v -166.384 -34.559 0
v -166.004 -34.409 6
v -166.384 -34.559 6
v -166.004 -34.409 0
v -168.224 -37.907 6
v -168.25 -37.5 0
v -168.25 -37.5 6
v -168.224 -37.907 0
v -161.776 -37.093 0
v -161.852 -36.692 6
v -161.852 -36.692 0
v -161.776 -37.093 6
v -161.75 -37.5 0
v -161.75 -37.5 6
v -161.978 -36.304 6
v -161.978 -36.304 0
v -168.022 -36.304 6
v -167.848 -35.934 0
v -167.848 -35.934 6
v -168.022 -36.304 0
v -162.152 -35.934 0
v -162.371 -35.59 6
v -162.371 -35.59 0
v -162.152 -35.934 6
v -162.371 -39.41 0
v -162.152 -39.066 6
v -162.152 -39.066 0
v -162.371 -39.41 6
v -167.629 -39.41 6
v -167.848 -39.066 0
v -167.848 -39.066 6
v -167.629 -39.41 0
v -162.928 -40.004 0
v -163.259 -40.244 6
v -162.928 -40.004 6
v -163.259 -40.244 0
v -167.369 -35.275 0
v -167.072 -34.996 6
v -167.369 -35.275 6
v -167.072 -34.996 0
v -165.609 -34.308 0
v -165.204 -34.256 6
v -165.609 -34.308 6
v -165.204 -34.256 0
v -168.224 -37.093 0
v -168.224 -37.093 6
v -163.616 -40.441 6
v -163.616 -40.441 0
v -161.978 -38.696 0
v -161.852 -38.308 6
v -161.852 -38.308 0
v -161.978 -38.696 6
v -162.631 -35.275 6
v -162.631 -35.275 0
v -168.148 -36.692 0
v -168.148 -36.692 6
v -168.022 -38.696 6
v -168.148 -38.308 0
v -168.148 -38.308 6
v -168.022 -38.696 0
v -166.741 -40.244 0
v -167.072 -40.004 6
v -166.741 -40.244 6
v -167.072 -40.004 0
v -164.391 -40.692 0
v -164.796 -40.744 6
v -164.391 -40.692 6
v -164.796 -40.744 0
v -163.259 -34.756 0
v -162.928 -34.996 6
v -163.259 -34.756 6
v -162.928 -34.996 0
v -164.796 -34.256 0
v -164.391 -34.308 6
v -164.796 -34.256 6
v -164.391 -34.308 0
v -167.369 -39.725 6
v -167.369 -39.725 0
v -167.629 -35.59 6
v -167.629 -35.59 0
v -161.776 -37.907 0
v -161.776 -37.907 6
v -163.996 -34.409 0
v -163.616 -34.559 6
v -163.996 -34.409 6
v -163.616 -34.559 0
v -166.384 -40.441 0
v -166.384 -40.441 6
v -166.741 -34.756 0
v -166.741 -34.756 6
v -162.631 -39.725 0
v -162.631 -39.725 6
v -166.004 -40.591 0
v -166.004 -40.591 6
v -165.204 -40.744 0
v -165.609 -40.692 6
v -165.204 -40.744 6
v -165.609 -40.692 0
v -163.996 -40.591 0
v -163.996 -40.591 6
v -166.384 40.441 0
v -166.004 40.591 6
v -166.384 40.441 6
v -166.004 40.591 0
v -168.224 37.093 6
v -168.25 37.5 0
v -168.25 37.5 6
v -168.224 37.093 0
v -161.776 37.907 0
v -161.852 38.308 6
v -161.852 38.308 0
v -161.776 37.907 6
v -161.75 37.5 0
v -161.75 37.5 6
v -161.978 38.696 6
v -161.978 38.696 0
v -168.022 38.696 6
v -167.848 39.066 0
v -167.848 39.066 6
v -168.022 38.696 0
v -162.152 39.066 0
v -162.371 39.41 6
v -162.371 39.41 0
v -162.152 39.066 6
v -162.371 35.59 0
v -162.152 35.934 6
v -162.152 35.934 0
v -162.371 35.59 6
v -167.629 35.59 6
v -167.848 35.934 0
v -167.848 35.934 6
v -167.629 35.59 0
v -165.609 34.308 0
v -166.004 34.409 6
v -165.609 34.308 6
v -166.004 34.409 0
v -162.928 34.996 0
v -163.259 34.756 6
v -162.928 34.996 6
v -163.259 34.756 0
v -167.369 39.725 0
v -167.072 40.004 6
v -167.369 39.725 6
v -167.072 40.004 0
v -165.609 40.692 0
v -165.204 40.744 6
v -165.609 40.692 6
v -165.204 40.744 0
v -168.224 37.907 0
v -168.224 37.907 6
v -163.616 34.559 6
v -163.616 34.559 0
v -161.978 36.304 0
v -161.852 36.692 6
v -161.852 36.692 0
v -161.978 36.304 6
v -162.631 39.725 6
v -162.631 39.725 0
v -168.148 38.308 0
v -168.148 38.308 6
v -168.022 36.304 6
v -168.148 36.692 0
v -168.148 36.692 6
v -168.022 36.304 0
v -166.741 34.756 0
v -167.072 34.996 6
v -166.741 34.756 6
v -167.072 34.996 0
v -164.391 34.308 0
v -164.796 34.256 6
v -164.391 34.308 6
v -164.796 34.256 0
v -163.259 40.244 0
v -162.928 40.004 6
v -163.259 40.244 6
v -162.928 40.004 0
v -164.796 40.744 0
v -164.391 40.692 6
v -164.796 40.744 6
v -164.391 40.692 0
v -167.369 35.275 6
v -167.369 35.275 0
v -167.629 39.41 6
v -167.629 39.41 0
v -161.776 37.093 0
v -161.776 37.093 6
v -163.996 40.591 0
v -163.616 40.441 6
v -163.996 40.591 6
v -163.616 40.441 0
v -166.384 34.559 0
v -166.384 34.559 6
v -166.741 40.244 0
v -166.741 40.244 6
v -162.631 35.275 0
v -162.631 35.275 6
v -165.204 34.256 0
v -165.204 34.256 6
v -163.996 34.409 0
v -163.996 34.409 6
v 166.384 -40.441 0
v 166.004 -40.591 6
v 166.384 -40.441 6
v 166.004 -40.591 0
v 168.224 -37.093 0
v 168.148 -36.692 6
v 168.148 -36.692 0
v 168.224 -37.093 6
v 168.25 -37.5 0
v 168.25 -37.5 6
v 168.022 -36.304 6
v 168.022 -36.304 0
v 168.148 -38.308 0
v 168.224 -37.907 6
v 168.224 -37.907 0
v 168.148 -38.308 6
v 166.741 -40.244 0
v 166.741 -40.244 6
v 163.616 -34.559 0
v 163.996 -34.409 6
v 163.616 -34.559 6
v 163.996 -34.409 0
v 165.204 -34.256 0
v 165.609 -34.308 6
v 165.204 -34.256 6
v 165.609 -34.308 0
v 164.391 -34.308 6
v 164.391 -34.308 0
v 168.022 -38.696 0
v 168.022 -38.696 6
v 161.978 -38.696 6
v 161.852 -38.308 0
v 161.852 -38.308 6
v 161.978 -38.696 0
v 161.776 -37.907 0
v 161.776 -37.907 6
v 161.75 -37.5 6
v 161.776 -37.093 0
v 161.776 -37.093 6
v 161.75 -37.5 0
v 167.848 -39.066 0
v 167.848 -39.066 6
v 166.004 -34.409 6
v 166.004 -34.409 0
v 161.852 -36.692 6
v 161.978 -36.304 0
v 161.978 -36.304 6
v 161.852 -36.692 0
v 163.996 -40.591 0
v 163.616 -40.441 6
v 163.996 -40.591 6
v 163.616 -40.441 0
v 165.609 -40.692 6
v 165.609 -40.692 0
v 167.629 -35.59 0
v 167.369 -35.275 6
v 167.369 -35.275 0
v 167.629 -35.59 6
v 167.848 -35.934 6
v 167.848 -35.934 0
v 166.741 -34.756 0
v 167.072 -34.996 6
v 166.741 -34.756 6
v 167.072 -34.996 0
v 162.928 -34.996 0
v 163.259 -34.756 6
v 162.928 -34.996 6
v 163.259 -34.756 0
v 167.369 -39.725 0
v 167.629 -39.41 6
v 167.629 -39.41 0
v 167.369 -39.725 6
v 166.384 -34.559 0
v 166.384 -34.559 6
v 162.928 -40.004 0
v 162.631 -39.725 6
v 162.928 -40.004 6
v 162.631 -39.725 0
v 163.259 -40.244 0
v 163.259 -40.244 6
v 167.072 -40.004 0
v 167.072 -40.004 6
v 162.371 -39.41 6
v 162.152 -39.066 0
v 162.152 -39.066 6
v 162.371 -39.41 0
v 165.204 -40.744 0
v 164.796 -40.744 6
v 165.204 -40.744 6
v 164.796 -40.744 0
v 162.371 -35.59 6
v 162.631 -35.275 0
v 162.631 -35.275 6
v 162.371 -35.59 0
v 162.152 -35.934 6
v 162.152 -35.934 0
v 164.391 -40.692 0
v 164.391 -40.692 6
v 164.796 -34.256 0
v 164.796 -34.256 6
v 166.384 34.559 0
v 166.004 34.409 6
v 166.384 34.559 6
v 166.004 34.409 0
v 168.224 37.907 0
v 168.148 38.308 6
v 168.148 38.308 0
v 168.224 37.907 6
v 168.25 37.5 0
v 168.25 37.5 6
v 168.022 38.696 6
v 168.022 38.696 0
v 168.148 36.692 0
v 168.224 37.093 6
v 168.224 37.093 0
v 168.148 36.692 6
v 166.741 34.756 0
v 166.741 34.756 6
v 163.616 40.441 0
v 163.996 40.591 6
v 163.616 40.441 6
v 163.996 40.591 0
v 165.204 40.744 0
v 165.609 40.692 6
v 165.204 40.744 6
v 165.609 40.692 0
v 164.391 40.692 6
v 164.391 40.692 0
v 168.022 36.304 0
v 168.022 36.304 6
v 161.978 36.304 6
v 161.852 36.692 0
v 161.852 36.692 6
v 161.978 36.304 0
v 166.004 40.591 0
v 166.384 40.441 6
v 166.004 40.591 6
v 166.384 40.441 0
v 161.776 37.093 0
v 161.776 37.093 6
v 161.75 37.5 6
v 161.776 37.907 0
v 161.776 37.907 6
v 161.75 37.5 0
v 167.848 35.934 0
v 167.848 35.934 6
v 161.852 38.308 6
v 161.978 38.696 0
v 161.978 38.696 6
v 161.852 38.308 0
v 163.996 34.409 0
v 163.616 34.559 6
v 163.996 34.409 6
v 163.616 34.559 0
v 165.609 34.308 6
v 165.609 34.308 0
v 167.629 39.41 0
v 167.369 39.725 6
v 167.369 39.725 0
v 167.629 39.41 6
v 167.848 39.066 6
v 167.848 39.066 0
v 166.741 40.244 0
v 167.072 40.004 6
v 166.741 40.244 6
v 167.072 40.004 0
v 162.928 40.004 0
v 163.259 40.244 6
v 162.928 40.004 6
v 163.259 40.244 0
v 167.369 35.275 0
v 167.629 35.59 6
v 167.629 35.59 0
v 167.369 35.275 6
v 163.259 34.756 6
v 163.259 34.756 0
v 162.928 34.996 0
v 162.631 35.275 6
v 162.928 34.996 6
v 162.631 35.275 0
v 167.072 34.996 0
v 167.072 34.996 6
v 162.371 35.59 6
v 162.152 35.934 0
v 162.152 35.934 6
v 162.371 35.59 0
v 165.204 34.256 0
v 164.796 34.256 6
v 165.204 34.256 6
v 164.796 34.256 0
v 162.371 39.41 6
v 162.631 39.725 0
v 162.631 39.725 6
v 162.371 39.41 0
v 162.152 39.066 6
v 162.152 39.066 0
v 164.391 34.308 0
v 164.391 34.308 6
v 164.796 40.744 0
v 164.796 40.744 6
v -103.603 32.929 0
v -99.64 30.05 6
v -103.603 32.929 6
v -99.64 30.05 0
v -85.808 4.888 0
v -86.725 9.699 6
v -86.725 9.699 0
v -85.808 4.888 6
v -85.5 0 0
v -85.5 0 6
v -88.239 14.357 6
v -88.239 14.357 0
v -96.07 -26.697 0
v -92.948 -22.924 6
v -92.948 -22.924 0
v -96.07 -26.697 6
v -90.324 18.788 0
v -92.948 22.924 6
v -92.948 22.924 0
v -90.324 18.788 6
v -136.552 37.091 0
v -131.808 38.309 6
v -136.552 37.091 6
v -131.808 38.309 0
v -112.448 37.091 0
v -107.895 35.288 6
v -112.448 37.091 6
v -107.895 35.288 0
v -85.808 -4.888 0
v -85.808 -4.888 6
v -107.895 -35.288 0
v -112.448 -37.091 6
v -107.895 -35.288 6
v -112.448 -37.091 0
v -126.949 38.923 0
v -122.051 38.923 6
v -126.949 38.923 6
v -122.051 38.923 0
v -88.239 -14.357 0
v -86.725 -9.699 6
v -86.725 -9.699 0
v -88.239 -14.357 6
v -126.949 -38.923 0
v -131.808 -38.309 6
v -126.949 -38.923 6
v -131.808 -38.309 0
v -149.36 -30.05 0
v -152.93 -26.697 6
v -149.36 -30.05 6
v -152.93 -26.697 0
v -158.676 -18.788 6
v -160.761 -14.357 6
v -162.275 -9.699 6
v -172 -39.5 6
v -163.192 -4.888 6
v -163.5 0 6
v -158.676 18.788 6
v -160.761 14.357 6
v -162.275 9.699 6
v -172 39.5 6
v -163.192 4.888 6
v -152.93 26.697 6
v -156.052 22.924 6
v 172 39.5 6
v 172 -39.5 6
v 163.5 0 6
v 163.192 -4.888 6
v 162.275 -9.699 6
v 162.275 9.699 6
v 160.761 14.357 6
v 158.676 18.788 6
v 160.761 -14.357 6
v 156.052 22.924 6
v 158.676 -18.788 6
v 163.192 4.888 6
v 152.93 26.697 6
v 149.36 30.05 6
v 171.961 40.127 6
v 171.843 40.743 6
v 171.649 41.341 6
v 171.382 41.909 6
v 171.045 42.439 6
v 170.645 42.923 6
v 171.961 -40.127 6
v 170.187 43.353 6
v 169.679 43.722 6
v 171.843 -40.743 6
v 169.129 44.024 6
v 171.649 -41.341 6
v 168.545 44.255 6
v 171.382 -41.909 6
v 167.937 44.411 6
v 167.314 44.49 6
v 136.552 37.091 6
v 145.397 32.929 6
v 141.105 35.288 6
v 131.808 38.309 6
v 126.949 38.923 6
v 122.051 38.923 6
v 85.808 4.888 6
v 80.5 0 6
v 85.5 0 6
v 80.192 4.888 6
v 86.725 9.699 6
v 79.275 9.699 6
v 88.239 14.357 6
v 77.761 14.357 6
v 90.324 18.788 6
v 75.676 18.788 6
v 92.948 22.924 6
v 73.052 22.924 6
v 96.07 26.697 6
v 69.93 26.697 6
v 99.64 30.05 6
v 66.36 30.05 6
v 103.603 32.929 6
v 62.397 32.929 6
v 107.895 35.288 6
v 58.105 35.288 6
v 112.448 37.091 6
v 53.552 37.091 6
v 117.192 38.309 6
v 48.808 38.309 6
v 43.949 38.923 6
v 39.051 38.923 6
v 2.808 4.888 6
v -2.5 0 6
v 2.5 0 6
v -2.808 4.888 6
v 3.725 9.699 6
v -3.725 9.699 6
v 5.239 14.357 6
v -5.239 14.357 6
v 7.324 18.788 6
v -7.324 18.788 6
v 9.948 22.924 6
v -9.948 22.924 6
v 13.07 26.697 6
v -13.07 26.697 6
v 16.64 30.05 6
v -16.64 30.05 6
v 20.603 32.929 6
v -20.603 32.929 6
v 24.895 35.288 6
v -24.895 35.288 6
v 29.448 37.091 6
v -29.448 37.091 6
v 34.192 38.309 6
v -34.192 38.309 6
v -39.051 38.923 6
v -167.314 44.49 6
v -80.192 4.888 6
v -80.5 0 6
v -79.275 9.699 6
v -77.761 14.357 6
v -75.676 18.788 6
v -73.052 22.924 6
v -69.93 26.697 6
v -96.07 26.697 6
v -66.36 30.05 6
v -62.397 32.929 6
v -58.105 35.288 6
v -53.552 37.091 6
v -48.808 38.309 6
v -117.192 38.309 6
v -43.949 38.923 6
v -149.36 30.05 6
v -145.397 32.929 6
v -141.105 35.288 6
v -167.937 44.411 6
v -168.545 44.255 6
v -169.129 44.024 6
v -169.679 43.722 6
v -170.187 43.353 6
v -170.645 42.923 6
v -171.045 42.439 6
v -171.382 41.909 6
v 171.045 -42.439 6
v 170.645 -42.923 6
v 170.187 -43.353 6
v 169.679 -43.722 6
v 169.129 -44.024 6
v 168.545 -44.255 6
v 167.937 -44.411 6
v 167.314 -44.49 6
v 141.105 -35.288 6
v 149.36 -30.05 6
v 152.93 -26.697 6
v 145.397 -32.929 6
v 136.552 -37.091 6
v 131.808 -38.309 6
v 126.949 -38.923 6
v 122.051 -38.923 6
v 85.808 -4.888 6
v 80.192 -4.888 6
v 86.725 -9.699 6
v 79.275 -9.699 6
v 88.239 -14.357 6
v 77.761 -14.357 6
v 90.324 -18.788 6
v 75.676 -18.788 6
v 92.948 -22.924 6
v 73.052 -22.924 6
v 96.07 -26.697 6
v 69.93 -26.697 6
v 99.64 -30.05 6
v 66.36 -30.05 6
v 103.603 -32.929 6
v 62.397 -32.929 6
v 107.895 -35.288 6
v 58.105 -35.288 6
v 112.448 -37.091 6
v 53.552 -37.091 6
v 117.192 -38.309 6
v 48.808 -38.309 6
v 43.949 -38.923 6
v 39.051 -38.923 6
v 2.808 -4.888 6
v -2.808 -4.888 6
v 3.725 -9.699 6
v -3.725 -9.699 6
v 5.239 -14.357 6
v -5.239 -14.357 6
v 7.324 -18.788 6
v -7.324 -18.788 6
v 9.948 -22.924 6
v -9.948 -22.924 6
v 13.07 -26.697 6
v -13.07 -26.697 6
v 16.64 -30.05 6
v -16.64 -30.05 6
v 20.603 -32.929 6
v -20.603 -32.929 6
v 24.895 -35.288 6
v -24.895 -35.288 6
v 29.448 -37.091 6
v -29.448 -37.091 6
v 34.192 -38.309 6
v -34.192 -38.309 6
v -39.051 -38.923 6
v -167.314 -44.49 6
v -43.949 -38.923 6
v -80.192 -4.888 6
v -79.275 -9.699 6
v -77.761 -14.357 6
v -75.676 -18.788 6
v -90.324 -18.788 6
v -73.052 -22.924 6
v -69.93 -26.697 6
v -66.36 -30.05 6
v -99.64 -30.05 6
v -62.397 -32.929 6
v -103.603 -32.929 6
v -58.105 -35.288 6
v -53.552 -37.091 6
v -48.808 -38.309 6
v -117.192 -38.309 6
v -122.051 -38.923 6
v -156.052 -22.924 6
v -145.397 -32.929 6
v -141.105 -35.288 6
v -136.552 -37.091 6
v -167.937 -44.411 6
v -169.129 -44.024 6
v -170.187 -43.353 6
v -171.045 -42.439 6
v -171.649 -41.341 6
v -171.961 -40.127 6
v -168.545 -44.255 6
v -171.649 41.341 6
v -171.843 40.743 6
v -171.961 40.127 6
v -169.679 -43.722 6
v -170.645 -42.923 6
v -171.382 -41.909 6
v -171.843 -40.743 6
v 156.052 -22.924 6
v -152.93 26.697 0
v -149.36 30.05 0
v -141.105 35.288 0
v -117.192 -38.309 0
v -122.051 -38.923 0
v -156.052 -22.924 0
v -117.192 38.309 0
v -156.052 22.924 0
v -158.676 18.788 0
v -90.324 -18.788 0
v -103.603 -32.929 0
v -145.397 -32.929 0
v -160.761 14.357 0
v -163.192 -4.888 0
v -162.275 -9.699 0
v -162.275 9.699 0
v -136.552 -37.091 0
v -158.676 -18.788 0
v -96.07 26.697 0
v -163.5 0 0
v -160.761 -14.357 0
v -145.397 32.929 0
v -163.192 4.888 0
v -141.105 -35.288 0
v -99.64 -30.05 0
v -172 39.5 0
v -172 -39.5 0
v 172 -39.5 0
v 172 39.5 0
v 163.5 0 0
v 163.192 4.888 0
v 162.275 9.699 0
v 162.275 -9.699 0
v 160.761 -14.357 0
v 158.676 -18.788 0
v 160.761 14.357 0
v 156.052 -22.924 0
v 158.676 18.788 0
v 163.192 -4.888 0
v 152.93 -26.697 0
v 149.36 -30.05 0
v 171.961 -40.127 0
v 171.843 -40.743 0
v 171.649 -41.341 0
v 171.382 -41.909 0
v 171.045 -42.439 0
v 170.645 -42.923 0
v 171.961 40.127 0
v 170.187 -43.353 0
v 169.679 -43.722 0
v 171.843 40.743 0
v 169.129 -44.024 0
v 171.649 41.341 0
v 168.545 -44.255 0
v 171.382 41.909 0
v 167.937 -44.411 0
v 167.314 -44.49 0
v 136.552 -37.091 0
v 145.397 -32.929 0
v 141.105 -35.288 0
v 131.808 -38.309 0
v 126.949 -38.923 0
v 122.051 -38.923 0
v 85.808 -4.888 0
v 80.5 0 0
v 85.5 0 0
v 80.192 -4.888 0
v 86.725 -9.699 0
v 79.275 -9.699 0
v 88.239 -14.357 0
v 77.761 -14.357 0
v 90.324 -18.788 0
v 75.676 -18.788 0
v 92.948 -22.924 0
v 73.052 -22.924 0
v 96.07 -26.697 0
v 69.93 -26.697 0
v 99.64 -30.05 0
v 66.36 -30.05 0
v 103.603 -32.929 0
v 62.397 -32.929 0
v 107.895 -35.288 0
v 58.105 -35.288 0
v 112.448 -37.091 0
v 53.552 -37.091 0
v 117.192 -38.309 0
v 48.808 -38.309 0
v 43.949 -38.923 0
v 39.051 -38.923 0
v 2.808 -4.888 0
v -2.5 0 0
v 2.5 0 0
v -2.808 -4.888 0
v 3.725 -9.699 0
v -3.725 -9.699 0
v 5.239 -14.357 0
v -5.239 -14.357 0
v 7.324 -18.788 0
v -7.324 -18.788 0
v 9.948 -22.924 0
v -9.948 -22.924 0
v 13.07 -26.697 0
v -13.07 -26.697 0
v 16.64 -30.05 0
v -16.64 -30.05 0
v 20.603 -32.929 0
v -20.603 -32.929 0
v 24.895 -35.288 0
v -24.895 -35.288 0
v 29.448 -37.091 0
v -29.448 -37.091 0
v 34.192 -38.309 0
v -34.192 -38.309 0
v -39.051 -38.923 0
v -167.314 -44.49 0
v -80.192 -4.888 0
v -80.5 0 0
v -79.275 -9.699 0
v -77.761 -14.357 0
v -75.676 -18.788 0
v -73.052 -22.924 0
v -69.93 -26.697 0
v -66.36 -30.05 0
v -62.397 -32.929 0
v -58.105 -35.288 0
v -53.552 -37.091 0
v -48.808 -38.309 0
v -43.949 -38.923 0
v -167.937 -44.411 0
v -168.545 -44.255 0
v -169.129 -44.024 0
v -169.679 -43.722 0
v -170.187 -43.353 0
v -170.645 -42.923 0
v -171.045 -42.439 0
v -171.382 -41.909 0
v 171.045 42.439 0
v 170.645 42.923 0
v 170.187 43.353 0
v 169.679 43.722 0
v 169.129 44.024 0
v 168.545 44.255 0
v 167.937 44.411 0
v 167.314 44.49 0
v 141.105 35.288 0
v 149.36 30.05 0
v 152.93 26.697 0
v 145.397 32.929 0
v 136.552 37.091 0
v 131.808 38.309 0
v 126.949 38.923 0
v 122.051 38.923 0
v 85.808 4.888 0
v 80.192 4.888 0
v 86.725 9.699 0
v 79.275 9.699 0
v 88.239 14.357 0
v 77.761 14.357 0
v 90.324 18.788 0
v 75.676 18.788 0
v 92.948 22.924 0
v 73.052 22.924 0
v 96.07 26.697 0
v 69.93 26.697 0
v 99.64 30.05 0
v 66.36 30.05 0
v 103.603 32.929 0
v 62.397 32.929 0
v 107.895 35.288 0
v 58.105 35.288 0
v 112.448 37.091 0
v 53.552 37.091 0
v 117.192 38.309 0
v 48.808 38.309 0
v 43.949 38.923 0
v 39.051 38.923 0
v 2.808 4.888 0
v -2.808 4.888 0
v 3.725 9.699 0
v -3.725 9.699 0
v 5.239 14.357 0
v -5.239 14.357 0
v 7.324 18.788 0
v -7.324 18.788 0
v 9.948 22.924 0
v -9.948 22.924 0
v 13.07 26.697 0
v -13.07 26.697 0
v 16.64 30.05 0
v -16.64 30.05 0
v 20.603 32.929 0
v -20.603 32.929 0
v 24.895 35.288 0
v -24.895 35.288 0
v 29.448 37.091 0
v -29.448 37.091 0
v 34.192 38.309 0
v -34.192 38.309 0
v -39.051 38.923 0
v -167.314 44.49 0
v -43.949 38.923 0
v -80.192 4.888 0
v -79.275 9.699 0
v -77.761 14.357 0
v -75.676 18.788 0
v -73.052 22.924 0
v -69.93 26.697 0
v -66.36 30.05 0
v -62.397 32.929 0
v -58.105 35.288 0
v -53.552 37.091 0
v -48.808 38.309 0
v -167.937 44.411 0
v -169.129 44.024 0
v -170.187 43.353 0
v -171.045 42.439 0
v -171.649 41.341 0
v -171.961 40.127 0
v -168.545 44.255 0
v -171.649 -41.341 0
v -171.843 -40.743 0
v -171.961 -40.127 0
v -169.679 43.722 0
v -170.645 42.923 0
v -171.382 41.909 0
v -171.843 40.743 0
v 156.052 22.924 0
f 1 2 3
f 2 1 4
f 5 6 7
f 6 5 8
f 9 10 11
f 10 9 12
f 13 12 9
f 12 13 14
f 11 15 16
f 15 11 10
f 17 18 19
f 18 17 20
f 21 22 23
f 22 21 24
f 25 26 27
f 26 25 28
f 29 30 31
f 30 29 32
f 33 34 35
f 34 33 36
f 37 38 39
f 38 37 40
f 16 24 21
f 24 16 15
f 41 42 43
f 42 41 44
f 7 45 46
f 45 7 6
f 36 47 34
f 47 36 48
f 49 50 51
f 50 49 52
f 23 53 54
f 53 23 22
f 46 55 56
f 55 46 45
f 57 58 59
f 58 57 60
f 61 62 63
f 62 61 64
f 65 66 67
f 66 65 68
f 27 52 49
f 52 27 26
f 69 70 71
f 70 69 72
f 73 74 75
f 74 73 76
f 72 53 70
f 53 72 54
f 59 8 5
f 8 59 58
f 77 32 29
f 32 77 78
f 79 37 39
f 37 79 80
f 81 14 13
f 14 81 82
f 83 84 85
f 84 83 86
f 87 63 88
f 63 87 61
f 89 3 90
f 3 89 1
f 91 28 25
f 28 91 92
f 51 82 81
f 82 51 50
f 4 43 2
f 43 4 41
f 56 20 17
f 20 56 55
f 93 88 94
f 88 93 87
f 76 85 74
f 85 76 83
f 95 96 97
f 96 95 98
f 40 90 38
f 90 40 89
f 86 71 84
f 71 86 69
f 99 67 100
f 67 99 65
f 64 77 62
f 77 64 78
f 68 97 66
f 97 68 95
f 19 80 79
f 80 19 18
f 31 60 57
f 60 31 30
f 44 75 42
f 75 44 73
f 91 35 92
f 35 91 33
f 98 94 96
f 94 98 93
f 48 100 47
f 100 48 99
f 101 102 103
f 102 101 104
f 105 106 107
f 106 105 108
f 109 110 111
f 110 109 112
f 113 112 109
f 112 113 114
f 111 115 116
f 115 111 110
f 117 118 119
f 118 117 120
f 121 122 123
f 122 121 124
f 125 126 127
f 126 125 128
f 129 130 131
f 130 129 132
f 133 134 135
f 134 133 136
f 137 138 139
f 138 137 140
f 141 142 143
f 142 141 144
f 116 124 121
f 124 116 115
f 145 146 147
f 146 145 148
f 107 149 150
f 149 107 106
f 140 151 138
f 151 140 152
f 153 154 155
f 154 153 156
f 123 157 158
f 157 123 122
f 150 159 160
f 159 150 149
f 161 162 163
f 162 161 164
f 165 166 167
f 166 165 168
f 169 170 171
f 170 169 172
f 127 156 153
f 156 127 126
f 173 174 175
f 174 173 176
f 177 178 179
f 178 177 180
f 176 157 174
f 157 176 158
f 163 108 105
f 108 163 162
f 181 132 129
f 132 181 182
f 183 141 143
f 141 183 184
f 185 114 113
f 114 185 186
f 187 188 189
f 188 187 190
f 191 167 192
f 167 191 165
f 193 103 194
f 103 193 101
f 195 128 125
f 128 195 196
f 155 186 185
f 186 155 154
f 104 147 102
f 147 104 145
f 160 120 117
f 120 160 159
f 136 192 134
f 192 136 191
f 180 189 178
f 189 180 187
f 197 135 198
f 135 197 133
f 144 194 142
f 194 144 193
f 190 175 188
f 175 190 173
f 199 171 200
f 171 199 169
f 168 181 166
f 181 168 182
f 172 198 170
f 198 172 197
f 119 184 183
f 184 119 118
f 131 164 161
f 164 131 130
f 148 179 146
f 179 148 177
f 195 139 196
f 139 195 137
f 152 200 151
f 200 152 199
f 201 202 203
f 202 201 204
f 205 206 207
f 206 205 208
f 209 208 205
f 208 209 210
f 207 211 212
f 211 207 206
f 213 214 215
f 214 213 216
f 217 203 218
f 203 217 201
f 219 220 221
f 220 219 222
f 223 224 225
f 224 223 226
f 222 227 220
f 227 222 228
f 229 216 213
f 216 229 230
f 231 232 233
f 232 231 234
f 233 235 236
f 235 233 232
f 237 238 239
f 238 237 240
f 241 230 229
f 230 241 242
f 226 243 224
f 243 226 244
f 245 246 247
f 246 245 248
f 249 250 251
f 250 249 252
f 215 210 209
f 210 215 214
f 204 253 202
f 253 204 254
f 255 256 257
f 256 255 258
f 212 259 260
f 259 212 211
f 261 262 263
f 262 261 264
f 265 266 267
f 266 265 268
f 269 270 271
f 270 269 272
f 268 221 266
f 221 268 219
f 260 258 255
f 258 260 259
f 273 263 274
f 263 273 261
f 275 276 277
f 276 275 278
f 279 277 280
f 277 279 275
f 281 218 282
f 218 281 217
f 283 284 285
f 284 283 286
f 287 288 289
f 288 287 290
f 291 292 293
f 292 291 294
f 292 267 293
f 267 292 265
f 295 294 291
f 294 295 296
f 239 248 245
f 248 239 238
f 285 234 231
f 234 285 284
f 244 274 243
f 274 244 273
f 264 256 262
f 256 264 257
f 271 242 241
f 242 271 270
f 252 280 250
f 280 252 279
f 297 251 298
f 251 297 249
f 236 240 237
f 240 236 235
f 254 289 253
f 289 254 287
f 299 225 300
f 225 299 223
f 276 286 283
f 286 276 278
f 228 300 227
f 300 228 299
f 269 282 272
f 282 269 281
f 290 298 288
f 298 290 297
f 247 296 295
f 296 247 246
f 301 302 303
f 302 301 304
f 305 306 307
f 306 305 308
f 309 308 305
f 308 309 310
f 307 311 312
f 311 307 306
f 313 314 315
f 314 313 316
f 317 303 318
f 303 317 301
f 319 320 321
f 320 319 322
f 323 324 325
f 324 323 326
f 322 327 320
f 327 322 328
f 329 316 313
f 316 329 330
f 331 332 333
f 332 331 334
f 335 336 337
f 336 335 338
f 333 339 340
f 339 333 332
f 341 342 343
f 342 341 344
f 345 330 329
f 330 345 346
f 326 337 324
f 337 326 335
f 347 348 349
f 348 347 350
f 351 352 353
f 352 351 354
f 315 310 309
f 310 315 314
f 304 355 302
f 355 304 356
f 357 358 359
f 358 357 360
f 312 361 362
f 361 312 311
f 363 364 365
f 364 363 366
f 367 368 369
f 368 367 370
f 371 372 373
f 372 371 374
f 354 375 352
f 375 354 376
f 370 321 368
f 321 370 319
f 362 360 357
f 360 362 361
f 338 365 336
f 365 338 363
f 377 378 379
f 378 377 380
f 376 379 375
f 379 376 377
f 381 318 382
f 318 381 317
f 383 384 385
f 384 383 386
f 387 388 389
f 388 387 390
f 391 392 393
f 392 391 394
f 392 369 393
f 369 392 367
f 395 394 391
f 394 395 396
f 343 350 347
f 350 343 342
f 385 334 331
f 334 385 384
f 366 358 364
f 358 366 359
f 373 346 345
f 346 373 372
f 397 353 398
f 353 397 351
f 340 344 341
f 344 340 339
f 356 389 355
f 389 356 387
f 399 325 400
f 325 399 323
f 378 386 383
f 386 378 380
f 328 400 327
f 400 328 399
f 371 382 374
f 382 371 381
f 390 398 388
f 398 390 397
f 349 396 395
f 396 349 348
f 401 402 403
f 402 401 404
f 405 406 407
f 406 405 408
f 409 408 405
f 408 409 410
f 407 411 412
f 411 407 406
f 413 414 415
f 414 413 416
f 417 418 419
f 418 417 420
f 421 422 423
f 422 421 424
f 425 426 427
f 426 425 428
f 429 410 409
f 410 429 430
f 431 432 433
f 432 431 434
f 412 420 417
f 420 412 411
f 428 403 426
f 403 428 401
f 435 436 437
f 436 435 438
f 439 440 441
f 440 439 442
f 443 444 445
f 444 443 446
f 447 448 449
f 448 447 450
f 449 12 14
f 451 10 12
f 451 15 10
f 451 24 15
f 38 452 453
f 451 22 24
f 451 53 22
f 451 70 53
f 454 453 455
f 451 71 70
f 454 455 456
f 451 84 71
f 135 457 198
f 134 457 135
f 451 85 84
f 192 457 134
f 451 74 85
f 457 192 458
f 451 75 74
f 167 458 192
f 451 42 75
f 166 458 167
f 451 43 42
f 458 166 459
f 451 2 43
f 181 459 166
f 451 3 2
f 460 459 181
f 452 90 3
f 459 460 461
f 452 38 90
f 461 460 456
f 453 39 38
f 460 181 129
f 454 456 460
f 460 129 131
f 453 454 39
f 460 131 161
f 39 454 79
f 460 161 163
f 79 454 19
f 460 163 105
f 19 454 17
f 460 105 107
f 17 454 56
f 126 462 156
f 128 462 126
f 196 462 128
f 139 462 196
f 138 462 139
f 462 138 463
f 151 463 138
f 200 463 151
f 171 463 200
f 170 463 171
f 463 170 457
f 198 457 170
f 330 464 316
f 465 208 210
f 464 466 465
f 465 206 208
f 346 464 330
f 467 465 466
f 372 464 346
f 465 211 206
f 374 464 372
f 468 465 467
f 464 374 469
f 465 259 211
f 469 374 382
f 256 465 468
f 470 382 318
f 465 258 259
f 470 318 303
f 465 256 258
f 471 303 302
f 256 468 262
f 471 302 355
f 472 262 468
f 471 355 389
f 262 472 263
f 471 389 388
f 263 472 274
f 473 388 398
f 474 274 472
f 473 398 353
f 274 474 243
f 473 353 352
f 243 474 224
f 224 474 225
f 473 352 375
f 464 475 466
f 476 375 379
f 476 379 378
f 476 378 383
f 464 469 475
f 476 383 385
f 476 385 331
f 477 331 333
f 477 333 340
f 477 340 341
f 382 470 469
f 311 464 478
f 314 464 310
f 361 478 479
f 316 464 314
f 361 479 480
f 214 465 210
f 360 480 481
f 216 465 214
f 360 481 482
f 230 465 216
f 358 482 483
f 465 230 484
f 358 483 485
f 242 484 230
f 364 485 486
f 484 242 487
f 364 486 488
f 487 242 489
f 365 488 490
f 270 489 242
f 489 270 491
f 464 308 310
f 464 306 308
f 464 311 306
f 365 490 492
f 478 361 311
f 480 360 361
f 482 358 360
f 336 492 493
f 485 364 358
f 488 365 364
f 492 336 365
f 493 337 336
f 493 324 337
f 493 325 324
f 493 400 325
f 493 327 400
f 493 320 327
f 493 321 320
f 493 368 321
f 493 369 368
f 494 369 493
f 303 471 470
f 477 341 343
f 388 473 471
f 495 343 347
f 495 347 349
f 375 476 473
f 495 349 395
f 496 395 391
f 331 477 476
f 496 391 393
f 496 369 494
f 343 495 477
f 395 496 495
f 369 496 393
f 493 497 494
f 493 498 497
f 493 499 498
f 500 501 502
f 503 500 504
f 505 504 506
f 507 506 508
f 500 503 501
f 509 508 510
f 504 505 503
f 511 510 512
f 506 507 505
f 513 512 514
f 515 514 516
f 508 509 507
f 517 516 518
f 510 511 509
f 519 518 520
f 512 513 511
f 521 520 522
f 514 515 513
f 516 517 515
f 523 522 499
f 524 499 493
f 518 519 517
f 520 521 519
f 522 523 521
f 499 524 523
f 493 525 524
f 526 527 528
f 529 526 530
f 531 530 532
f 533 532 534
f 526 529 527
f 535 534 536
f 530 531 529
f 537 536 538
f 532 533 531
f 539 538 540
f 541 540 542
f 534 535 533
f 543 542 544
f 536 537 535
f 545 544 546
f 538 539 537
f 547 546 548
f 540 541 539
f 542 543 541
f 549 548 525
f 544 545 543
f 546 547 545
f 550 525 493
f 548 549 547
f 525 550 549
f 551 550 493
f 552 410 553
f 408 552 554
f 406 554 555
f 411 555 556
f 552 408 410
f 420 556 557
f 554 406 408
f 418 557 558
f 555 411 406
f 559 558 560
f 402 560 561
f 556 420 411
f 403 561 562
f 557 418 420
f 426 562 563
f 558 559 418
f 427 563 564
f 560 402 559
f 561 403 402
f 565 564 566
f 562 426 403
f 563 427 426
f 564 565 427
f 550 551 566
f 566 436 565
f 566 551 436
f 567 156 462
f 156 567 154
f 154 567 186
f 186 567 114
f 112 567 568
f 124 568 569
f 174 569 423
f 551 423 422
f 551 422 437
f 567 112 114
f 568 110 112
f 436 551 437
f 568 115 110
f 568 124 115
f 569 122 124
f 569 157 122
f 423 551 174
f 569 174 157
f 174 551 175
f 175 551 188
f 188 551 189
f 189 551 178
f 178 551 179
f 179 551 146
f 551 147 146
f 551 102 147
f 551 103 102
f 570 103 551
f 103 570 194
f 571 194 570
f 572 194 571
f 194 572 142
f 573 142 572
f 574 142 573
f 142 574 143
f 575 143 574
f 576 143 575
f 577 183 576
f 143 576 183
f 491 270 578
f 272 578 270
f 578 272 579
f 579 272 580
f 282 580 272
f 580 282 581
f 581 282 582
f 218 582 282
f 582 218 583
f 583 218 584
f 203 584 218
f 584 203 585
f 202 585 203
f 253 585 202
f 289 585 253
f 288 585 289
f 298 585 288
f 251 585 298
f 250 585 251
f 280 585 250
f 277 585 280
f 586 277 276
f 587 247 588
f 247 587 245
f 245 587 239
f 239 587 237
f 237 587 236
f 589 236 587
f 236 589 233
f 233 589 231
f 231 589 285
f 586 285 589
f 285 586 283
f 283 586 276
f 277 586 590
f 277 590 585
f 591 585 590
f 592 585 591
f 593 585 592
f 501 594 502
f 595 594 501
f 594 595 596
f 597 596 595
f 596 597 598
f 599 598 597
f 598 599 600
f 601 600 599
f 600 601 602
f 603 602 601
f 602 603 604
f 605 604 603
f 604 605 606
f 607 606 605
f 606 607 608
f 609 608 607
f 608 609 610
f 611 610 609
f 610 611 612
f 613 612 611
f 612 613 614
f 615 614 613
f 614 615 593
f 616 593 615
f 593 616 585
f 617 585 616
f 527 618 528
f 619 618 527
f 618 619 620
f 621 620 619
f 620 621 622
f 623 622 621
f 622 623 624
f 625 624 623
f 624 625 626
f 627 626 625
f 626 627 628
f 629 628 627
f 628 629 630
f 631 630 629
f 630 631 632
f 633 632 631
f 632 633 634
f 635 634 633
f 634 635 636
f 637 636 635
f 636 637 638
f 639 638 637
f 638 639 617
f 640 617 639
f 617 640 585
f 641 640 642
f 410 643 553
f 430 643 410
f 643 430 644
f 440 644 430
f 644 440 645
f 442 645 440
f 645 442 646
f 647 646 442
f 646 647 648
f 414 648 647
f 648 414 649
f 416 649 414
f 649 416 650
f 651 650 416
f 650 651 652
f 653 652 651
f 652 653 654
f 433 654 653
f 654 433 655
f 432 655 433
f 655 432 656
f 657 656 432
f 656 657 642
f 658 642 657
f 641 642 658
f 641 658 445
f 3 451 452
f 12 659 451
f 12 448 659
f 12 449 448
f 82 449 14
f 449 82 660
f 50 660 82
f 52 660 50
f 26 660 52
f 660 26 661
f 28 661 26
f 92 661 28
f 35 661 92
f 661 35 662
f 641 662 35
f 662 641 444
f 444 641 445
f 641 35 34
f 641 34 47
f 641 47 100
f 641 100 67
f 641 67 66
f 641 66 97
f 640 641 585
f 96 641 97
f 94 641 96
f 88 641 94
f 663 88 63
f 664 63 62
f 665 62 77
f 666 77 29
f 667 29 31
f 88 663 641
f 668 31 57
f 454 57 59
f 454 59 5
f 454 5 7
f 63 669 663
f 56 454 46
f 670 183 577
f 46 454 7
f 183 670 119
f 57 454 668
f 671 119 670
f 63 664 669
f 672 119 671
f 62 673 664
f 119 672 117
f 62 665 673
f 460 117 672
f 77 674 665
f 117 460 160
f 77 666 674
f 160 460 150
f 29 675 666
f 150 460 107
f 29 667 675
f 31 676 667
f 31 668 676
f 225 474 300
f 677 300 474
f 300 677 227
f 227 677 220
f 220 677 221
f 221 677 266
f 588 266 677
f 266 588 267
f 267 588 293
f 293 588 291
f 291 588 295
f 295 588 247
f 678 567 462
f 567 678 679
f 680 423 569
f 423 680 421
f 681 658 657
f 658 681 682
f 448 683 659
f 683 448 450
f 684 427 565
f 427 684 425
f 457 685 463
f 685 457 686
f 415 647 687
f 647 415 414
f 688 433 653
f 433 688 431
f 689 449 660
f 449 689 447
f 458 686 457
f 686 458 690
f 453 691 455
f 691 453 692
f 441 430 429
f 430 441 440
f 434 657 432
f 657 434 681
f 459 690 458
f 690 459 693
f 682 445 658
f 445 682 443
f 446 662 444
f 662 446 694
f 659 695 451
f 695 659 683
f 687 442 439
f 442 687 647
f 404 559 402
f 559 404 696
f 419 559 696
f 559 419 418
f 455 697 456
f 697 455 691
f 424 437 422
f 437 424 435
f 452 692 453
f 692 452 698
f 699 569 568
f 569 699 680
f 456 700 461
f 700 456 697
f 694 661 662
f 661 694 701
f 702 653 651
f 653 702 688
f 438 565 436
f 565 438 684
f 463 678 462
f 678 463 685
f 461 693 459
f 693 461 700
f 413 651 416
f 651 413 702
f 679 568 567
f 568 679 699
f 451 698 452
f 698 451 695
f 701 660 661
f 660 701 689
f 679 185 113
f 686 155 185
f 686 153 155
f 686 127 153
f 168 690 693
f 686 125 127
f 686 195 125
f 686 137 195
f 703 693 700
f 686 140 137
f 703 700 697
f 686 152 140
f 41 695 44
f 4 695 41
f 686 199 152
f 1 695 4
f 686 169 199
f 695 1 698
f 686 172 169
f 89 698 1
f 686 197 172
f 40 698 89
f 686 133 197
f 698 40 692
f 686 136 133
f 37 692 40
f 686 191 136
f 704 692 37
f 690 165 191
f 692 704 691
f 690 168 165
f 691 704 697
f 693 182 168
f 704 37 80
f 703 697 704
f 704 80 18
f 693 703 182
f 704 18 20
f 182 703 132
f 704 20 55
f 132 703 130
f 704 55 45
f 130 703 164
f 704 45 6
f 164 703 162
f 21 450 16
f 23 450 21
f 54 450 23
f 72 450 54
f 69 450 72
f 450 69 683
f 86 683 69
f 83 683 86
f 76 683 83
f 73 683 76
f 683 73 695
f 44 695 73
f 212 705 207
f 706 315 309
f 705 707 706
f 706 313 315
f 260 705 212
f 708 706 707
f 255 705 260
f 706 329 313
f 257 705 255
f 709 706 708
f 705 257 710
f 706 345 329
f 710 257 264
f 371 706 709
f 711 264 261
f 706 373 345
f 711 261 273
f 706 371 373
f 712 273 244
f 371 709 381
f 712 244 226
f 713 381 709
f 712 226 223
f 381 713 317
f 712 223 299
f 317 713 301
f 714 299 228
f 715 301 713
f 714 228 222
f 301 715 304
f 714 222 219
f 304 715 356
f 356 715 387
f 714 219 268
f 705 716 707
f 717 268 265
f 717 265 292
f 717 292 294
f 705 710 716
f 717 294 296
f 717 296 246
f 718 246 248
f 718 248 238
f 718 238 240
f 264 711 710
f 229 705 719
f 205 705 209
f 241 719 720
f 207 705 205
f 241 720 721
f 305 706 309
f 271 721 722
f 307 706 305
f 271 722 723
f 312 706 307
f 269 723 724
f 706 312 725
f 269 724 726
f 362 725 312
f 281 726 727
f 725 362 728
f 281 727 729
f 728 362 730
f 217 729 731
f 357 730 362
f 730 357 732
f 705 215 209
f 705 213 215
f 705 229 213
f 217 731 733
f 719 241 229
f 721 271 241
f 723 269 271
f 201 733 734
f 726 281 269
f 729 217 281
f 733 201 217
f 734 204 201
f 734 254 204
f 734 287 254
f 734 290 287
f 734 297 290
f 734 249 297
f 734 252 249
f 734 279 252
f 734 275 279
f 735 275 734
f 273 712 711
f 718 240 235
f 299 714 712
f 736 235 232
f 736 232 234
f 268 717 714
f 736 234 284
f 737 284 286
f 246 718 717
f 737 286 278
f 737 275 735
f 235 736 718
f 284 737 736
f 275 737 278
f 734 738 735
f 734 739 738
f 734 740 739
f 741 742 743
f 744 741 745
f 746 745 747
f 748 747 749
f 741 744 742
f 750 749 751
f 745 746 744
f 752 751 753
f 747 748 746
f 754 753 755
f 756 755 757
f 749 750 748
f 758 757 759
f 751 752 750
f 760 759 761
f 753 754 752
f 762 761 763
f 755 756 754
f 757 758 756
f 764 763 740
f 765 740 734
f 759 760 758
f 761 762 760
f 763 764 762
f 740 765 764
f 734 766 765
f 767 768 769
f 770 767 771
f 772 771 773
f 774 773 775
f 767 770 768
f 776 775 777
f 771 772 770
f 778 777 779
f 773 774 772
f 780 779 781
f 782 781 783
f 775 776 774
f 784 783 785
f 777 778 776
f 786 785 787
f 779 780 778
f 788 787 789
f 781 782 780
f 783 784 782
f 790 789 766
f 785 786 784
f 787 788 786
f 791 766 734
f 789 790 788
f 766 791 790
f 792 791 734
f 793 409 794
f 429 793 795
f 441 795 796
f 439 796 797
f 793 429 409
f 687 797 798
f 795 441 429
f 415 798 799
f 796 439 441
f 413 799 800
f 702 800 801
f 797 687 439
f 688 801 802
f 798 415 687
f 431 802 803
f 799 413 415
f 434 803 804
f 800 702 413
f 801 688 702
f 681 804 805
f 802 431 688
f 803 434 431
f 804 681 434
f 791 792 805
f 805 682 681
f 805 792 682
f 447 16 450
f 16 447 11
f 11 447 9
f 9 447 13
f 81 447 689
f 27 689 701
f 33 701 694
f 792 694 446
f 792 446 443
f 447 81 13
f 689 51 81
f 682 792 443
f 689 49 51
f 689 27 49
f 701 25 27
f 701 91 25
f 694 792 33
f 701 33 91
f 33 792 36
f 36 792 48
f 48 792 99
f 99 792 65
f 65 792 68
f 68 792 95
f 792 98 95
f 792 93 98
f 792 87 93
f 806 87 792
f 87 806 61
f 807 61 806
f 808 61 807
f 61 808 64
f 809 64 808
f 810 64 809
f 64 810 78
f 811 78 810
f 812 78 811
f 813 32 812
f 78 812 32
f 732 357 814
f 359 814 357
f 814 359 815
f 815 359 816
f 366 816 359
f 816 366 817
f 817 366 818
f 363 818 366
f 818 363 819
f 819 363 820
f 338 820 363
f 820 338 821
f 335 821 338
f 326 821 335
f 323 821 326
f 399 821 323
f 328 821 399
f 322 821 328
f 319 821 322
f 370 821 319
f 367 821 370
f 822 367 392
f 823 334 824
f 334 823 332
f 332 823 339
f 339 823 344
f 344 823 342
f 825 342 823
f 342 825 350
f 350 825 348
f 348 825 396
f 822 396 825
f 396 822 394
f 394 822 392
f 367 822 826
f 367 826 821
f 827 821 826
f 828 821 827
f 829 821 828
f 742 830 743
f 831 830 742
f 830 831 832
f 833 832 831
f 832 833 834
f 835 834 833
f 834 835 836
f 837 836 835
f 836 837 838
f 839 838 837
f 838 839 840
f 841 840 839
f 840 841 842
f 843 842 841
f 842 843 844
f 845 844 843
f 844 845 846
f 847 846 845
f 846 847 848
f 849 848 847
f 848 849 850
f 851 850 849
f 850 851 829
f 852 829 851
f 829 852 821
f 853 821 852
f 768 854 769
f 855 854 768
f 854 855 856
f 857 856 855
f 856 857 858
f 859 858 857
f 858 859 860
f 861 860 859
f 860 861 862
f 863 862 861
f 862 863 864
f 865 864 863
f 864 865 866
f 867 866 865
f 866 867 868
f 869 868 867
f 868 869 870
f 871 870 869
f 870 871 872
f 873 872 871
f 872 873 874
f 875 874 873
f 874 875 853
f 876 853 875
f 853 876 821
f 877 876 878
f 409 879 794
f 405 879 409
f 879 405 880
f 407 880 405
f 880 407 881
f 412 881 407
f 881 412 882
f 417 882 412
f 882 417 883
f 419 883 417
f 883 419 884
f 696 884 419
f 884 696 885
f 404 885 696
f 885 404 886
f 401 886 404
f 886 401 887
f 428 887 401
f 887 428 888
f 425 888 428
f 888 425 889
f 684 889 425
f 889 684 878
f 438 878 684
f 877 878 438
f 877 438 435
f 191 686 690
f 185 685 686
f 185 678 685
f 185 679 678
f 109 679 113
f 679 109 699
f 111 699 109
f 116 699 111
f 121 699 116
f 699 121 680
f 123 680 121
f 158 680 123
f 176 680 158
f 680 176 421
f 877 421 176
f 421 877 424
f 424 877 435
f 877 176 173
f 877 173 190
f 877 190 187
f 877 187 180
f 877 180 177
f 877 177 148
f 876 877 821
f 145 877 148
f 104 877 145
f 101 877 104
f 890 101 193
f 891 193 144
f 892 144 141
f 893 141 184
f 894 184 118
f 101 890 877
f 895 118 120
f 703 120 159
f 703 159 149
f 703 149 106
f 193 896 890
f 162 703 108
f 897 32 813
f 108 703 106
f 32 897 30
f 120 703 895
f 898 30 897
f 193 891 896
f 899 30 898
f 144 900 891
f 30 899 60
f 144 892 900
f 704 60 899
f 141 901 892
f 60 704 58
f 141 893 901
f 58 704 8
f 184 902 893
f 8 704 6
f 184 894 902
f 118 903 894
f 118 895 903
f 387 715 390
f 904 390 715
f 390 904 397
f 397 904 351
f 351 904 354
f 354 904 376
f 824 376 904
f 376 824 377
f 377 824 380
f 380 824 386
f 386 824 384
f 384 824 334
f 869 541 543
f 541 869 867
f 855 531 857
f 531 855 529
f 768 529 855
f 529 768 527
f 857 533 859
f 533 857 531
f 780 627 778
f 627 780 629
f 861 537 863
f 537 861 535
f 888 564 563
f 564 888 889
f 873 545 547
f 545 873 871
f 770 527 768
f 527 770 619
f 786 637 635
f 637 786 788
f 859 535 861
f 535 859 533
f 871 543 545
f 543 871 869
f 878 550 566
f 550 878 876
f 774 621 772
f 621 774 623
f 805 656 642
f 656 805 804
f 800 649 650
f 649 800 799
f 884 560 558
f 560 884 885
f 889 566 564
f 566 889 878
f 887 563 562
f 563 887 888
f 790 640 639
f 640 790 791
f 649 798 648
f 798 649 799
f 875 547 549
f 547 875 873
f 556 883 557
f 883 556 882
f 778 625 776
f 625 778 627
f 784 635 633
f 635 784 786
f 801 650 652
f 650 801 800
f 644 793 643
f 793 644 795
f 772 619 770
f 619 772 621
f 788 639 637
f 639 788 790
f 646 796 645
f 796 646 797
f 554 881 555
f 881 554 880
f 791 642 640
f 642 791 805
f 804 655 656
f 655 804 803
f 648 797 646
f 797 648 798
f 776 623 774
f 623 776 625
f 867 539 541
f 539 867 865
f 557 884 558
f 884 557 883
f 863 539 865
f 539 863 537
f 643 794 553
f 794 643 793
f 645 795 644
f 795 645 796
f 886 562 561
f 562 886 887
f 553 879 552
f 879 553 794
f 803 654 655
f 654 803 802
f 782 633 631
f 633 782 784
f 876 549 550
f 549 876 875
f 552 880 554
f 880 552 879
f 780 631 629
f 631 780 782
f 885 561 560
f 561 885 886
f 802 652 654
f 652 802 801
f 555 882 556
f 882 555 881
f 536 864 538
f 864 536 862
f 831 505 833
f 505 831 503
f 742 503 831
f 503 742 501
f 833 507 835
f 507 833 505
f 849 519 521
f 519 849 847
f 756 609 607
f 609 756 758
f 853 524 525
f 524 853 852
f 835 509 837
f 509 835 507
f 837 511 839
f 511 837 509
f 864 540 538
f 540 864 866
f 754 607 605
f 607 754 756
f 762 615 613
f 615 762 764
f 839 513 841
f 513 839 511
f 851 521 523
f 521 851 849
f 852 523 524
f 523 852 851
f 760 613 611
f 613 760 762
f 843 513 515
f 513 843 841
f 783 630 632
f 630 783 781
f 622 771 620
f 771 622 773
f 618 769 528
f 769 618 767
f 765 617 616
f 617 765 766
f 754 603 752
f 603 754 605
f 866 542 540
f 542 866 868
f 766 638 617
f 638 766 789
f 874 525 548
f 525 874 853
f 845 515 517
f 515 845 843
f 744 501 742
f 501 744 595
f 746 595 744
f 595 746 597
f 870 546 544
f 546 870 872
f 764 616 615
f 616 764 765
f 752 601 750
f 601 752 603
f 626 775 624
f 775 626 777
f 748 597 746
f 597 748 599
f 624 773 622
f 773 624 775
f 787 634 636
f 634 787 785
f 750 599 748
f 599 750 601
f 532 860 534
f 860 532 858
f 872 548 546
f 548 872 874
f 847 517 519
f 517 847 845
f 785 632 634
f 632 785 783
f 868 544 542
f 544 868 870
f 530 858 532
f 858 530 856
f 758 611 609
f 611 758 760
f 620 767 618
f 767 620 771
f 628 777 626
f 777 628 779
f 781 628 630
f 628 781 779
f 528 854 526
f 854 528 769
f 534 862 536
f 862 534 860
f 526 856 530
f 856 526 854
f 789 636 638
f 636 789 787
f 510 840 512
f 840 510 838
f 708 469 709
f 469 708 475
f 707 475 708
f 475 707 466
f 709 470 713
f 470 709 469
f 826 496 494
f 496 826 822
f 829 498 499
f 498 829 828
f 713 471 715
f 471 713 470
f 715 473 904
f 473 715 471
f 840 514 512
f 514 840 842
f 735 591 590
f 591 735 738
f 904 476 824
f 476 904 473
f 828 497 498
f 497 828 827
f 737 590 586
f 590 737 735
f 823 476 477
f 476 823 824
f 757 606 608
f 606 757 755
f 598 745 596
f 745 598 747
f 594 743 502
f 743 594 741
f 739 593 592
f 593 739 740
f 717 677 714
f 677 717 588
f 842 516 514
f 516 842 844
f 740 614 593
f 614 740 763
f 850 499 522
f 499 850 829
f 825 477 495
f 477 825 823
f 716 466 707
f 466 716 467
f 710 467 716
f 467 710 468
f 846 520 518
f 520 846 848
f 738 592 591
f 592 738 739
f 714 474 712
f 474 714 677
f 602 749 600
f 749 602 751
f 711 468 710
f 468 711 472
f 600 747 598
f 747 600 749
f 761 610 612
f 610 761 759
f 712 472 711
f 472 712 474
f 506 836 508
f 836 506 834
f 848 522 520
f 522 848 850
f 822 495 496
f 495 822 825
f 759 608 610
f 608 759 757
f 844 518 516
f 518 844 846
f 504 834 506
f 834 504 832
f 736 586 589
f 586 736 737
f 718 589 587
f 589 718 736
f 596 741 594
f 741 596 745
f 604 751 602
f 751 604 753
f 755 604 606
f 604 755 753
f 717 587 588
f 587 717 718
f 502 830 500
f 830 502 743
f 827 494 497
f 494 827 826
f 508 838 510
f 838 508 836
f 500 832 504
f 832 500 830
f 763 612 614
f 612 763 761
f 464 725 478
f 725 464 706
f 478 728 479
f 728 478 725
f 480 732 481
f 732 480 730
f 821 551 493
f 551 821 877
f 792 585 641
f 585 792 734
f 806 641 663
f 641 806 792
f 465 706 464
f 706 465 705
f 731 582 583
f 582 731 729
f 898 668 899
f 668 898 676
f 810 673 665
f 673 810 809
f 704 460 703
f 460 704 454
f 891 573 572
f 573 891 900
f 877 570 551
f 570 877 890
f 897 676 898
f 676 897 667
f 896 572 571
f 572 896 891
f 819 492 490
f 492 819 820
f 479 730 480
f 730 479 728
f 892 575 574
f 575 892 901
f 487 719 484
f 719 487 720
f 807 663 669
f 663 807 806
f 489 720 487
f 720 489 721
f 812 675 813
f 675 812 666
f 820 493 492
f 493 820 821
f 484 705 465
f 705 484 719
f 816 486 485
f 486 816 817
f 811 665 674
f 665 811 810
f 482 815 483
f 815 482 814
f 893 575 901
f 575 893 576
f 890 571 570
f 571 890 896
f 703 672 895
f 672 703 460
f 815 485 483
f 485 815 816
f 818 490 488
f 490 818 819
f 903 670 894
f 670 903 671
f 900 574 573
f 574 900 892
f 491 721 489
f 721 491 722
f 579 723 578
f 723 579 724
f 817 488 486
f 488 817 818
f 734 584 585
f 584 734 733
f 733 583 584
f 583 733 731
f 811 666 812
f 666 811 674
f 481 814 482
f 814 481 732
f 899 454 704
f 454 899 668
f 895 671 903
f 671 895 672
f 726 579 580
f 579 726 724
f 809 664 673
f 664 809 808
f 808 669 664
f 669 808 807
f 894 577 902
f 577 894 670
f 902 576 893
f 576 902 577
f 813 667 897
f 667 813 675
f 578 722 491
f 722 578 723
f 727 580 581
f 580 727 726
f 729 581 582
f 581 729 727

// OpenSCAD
$fn = 50;


difference() {
	union() {
		hull() {
			translate(v = [-167.0000000000, 39.5000000000, 0]) {
				cylinder(h = 6, r = 5);
			}
			translate(v = [167.0000000000, 39.5000000000, 0]) {
				cylinder(h = 6, r = 5);
			}
			translate(v = [-167.0000000000, -39.5000000000, 0]) {
				cylinder(h = 6, r = 5);
			}
			translate(v = [167.0000000000, -39.5000000000, 0]) {
				cylinder(h = 6, r = 5);
			}
		}
	}
	union() {
		#translate(v = [-165.0000000000, -37.5000000000, -100.0000000000]) {
			cylinder(h = 200, r = 3.2500000000);
		}
		#translate(v = [-165.0000000000, 37.5000000000, -100.0000000000]) {
			cylinder(h = 200, r = 3.2500000000);
		}
		#translate(v = [165.0000000000, -37.5000000000, -100.0000000000]) {
			cylinder(h = 200, r = 3.2500000000);
		}
		#translate(v = [165.0000000000, 37.5000000000, -100.0000000000]) {
			cylinder(h = 200, r = 3.2500000000);
		}
		#translate(v = [-124.5000000000, 0, 0]) {
			cylinder(h = 6, r = 39.0000000000);
		}
		#translate(v = [-41.5000000000, 0, 0]) {
			cylinder(h = 6, r = 39.0000000000);
		}
		#translate(v = [41.5000000000, 0, 0]) {
			cylinder(h = 6, r = 39.0000000000);
		}
		#translate(v = [124.5000000000, 0, 0]) {
			cylinder(h = 6, r = 39.0000000000);
		}
	}
}
